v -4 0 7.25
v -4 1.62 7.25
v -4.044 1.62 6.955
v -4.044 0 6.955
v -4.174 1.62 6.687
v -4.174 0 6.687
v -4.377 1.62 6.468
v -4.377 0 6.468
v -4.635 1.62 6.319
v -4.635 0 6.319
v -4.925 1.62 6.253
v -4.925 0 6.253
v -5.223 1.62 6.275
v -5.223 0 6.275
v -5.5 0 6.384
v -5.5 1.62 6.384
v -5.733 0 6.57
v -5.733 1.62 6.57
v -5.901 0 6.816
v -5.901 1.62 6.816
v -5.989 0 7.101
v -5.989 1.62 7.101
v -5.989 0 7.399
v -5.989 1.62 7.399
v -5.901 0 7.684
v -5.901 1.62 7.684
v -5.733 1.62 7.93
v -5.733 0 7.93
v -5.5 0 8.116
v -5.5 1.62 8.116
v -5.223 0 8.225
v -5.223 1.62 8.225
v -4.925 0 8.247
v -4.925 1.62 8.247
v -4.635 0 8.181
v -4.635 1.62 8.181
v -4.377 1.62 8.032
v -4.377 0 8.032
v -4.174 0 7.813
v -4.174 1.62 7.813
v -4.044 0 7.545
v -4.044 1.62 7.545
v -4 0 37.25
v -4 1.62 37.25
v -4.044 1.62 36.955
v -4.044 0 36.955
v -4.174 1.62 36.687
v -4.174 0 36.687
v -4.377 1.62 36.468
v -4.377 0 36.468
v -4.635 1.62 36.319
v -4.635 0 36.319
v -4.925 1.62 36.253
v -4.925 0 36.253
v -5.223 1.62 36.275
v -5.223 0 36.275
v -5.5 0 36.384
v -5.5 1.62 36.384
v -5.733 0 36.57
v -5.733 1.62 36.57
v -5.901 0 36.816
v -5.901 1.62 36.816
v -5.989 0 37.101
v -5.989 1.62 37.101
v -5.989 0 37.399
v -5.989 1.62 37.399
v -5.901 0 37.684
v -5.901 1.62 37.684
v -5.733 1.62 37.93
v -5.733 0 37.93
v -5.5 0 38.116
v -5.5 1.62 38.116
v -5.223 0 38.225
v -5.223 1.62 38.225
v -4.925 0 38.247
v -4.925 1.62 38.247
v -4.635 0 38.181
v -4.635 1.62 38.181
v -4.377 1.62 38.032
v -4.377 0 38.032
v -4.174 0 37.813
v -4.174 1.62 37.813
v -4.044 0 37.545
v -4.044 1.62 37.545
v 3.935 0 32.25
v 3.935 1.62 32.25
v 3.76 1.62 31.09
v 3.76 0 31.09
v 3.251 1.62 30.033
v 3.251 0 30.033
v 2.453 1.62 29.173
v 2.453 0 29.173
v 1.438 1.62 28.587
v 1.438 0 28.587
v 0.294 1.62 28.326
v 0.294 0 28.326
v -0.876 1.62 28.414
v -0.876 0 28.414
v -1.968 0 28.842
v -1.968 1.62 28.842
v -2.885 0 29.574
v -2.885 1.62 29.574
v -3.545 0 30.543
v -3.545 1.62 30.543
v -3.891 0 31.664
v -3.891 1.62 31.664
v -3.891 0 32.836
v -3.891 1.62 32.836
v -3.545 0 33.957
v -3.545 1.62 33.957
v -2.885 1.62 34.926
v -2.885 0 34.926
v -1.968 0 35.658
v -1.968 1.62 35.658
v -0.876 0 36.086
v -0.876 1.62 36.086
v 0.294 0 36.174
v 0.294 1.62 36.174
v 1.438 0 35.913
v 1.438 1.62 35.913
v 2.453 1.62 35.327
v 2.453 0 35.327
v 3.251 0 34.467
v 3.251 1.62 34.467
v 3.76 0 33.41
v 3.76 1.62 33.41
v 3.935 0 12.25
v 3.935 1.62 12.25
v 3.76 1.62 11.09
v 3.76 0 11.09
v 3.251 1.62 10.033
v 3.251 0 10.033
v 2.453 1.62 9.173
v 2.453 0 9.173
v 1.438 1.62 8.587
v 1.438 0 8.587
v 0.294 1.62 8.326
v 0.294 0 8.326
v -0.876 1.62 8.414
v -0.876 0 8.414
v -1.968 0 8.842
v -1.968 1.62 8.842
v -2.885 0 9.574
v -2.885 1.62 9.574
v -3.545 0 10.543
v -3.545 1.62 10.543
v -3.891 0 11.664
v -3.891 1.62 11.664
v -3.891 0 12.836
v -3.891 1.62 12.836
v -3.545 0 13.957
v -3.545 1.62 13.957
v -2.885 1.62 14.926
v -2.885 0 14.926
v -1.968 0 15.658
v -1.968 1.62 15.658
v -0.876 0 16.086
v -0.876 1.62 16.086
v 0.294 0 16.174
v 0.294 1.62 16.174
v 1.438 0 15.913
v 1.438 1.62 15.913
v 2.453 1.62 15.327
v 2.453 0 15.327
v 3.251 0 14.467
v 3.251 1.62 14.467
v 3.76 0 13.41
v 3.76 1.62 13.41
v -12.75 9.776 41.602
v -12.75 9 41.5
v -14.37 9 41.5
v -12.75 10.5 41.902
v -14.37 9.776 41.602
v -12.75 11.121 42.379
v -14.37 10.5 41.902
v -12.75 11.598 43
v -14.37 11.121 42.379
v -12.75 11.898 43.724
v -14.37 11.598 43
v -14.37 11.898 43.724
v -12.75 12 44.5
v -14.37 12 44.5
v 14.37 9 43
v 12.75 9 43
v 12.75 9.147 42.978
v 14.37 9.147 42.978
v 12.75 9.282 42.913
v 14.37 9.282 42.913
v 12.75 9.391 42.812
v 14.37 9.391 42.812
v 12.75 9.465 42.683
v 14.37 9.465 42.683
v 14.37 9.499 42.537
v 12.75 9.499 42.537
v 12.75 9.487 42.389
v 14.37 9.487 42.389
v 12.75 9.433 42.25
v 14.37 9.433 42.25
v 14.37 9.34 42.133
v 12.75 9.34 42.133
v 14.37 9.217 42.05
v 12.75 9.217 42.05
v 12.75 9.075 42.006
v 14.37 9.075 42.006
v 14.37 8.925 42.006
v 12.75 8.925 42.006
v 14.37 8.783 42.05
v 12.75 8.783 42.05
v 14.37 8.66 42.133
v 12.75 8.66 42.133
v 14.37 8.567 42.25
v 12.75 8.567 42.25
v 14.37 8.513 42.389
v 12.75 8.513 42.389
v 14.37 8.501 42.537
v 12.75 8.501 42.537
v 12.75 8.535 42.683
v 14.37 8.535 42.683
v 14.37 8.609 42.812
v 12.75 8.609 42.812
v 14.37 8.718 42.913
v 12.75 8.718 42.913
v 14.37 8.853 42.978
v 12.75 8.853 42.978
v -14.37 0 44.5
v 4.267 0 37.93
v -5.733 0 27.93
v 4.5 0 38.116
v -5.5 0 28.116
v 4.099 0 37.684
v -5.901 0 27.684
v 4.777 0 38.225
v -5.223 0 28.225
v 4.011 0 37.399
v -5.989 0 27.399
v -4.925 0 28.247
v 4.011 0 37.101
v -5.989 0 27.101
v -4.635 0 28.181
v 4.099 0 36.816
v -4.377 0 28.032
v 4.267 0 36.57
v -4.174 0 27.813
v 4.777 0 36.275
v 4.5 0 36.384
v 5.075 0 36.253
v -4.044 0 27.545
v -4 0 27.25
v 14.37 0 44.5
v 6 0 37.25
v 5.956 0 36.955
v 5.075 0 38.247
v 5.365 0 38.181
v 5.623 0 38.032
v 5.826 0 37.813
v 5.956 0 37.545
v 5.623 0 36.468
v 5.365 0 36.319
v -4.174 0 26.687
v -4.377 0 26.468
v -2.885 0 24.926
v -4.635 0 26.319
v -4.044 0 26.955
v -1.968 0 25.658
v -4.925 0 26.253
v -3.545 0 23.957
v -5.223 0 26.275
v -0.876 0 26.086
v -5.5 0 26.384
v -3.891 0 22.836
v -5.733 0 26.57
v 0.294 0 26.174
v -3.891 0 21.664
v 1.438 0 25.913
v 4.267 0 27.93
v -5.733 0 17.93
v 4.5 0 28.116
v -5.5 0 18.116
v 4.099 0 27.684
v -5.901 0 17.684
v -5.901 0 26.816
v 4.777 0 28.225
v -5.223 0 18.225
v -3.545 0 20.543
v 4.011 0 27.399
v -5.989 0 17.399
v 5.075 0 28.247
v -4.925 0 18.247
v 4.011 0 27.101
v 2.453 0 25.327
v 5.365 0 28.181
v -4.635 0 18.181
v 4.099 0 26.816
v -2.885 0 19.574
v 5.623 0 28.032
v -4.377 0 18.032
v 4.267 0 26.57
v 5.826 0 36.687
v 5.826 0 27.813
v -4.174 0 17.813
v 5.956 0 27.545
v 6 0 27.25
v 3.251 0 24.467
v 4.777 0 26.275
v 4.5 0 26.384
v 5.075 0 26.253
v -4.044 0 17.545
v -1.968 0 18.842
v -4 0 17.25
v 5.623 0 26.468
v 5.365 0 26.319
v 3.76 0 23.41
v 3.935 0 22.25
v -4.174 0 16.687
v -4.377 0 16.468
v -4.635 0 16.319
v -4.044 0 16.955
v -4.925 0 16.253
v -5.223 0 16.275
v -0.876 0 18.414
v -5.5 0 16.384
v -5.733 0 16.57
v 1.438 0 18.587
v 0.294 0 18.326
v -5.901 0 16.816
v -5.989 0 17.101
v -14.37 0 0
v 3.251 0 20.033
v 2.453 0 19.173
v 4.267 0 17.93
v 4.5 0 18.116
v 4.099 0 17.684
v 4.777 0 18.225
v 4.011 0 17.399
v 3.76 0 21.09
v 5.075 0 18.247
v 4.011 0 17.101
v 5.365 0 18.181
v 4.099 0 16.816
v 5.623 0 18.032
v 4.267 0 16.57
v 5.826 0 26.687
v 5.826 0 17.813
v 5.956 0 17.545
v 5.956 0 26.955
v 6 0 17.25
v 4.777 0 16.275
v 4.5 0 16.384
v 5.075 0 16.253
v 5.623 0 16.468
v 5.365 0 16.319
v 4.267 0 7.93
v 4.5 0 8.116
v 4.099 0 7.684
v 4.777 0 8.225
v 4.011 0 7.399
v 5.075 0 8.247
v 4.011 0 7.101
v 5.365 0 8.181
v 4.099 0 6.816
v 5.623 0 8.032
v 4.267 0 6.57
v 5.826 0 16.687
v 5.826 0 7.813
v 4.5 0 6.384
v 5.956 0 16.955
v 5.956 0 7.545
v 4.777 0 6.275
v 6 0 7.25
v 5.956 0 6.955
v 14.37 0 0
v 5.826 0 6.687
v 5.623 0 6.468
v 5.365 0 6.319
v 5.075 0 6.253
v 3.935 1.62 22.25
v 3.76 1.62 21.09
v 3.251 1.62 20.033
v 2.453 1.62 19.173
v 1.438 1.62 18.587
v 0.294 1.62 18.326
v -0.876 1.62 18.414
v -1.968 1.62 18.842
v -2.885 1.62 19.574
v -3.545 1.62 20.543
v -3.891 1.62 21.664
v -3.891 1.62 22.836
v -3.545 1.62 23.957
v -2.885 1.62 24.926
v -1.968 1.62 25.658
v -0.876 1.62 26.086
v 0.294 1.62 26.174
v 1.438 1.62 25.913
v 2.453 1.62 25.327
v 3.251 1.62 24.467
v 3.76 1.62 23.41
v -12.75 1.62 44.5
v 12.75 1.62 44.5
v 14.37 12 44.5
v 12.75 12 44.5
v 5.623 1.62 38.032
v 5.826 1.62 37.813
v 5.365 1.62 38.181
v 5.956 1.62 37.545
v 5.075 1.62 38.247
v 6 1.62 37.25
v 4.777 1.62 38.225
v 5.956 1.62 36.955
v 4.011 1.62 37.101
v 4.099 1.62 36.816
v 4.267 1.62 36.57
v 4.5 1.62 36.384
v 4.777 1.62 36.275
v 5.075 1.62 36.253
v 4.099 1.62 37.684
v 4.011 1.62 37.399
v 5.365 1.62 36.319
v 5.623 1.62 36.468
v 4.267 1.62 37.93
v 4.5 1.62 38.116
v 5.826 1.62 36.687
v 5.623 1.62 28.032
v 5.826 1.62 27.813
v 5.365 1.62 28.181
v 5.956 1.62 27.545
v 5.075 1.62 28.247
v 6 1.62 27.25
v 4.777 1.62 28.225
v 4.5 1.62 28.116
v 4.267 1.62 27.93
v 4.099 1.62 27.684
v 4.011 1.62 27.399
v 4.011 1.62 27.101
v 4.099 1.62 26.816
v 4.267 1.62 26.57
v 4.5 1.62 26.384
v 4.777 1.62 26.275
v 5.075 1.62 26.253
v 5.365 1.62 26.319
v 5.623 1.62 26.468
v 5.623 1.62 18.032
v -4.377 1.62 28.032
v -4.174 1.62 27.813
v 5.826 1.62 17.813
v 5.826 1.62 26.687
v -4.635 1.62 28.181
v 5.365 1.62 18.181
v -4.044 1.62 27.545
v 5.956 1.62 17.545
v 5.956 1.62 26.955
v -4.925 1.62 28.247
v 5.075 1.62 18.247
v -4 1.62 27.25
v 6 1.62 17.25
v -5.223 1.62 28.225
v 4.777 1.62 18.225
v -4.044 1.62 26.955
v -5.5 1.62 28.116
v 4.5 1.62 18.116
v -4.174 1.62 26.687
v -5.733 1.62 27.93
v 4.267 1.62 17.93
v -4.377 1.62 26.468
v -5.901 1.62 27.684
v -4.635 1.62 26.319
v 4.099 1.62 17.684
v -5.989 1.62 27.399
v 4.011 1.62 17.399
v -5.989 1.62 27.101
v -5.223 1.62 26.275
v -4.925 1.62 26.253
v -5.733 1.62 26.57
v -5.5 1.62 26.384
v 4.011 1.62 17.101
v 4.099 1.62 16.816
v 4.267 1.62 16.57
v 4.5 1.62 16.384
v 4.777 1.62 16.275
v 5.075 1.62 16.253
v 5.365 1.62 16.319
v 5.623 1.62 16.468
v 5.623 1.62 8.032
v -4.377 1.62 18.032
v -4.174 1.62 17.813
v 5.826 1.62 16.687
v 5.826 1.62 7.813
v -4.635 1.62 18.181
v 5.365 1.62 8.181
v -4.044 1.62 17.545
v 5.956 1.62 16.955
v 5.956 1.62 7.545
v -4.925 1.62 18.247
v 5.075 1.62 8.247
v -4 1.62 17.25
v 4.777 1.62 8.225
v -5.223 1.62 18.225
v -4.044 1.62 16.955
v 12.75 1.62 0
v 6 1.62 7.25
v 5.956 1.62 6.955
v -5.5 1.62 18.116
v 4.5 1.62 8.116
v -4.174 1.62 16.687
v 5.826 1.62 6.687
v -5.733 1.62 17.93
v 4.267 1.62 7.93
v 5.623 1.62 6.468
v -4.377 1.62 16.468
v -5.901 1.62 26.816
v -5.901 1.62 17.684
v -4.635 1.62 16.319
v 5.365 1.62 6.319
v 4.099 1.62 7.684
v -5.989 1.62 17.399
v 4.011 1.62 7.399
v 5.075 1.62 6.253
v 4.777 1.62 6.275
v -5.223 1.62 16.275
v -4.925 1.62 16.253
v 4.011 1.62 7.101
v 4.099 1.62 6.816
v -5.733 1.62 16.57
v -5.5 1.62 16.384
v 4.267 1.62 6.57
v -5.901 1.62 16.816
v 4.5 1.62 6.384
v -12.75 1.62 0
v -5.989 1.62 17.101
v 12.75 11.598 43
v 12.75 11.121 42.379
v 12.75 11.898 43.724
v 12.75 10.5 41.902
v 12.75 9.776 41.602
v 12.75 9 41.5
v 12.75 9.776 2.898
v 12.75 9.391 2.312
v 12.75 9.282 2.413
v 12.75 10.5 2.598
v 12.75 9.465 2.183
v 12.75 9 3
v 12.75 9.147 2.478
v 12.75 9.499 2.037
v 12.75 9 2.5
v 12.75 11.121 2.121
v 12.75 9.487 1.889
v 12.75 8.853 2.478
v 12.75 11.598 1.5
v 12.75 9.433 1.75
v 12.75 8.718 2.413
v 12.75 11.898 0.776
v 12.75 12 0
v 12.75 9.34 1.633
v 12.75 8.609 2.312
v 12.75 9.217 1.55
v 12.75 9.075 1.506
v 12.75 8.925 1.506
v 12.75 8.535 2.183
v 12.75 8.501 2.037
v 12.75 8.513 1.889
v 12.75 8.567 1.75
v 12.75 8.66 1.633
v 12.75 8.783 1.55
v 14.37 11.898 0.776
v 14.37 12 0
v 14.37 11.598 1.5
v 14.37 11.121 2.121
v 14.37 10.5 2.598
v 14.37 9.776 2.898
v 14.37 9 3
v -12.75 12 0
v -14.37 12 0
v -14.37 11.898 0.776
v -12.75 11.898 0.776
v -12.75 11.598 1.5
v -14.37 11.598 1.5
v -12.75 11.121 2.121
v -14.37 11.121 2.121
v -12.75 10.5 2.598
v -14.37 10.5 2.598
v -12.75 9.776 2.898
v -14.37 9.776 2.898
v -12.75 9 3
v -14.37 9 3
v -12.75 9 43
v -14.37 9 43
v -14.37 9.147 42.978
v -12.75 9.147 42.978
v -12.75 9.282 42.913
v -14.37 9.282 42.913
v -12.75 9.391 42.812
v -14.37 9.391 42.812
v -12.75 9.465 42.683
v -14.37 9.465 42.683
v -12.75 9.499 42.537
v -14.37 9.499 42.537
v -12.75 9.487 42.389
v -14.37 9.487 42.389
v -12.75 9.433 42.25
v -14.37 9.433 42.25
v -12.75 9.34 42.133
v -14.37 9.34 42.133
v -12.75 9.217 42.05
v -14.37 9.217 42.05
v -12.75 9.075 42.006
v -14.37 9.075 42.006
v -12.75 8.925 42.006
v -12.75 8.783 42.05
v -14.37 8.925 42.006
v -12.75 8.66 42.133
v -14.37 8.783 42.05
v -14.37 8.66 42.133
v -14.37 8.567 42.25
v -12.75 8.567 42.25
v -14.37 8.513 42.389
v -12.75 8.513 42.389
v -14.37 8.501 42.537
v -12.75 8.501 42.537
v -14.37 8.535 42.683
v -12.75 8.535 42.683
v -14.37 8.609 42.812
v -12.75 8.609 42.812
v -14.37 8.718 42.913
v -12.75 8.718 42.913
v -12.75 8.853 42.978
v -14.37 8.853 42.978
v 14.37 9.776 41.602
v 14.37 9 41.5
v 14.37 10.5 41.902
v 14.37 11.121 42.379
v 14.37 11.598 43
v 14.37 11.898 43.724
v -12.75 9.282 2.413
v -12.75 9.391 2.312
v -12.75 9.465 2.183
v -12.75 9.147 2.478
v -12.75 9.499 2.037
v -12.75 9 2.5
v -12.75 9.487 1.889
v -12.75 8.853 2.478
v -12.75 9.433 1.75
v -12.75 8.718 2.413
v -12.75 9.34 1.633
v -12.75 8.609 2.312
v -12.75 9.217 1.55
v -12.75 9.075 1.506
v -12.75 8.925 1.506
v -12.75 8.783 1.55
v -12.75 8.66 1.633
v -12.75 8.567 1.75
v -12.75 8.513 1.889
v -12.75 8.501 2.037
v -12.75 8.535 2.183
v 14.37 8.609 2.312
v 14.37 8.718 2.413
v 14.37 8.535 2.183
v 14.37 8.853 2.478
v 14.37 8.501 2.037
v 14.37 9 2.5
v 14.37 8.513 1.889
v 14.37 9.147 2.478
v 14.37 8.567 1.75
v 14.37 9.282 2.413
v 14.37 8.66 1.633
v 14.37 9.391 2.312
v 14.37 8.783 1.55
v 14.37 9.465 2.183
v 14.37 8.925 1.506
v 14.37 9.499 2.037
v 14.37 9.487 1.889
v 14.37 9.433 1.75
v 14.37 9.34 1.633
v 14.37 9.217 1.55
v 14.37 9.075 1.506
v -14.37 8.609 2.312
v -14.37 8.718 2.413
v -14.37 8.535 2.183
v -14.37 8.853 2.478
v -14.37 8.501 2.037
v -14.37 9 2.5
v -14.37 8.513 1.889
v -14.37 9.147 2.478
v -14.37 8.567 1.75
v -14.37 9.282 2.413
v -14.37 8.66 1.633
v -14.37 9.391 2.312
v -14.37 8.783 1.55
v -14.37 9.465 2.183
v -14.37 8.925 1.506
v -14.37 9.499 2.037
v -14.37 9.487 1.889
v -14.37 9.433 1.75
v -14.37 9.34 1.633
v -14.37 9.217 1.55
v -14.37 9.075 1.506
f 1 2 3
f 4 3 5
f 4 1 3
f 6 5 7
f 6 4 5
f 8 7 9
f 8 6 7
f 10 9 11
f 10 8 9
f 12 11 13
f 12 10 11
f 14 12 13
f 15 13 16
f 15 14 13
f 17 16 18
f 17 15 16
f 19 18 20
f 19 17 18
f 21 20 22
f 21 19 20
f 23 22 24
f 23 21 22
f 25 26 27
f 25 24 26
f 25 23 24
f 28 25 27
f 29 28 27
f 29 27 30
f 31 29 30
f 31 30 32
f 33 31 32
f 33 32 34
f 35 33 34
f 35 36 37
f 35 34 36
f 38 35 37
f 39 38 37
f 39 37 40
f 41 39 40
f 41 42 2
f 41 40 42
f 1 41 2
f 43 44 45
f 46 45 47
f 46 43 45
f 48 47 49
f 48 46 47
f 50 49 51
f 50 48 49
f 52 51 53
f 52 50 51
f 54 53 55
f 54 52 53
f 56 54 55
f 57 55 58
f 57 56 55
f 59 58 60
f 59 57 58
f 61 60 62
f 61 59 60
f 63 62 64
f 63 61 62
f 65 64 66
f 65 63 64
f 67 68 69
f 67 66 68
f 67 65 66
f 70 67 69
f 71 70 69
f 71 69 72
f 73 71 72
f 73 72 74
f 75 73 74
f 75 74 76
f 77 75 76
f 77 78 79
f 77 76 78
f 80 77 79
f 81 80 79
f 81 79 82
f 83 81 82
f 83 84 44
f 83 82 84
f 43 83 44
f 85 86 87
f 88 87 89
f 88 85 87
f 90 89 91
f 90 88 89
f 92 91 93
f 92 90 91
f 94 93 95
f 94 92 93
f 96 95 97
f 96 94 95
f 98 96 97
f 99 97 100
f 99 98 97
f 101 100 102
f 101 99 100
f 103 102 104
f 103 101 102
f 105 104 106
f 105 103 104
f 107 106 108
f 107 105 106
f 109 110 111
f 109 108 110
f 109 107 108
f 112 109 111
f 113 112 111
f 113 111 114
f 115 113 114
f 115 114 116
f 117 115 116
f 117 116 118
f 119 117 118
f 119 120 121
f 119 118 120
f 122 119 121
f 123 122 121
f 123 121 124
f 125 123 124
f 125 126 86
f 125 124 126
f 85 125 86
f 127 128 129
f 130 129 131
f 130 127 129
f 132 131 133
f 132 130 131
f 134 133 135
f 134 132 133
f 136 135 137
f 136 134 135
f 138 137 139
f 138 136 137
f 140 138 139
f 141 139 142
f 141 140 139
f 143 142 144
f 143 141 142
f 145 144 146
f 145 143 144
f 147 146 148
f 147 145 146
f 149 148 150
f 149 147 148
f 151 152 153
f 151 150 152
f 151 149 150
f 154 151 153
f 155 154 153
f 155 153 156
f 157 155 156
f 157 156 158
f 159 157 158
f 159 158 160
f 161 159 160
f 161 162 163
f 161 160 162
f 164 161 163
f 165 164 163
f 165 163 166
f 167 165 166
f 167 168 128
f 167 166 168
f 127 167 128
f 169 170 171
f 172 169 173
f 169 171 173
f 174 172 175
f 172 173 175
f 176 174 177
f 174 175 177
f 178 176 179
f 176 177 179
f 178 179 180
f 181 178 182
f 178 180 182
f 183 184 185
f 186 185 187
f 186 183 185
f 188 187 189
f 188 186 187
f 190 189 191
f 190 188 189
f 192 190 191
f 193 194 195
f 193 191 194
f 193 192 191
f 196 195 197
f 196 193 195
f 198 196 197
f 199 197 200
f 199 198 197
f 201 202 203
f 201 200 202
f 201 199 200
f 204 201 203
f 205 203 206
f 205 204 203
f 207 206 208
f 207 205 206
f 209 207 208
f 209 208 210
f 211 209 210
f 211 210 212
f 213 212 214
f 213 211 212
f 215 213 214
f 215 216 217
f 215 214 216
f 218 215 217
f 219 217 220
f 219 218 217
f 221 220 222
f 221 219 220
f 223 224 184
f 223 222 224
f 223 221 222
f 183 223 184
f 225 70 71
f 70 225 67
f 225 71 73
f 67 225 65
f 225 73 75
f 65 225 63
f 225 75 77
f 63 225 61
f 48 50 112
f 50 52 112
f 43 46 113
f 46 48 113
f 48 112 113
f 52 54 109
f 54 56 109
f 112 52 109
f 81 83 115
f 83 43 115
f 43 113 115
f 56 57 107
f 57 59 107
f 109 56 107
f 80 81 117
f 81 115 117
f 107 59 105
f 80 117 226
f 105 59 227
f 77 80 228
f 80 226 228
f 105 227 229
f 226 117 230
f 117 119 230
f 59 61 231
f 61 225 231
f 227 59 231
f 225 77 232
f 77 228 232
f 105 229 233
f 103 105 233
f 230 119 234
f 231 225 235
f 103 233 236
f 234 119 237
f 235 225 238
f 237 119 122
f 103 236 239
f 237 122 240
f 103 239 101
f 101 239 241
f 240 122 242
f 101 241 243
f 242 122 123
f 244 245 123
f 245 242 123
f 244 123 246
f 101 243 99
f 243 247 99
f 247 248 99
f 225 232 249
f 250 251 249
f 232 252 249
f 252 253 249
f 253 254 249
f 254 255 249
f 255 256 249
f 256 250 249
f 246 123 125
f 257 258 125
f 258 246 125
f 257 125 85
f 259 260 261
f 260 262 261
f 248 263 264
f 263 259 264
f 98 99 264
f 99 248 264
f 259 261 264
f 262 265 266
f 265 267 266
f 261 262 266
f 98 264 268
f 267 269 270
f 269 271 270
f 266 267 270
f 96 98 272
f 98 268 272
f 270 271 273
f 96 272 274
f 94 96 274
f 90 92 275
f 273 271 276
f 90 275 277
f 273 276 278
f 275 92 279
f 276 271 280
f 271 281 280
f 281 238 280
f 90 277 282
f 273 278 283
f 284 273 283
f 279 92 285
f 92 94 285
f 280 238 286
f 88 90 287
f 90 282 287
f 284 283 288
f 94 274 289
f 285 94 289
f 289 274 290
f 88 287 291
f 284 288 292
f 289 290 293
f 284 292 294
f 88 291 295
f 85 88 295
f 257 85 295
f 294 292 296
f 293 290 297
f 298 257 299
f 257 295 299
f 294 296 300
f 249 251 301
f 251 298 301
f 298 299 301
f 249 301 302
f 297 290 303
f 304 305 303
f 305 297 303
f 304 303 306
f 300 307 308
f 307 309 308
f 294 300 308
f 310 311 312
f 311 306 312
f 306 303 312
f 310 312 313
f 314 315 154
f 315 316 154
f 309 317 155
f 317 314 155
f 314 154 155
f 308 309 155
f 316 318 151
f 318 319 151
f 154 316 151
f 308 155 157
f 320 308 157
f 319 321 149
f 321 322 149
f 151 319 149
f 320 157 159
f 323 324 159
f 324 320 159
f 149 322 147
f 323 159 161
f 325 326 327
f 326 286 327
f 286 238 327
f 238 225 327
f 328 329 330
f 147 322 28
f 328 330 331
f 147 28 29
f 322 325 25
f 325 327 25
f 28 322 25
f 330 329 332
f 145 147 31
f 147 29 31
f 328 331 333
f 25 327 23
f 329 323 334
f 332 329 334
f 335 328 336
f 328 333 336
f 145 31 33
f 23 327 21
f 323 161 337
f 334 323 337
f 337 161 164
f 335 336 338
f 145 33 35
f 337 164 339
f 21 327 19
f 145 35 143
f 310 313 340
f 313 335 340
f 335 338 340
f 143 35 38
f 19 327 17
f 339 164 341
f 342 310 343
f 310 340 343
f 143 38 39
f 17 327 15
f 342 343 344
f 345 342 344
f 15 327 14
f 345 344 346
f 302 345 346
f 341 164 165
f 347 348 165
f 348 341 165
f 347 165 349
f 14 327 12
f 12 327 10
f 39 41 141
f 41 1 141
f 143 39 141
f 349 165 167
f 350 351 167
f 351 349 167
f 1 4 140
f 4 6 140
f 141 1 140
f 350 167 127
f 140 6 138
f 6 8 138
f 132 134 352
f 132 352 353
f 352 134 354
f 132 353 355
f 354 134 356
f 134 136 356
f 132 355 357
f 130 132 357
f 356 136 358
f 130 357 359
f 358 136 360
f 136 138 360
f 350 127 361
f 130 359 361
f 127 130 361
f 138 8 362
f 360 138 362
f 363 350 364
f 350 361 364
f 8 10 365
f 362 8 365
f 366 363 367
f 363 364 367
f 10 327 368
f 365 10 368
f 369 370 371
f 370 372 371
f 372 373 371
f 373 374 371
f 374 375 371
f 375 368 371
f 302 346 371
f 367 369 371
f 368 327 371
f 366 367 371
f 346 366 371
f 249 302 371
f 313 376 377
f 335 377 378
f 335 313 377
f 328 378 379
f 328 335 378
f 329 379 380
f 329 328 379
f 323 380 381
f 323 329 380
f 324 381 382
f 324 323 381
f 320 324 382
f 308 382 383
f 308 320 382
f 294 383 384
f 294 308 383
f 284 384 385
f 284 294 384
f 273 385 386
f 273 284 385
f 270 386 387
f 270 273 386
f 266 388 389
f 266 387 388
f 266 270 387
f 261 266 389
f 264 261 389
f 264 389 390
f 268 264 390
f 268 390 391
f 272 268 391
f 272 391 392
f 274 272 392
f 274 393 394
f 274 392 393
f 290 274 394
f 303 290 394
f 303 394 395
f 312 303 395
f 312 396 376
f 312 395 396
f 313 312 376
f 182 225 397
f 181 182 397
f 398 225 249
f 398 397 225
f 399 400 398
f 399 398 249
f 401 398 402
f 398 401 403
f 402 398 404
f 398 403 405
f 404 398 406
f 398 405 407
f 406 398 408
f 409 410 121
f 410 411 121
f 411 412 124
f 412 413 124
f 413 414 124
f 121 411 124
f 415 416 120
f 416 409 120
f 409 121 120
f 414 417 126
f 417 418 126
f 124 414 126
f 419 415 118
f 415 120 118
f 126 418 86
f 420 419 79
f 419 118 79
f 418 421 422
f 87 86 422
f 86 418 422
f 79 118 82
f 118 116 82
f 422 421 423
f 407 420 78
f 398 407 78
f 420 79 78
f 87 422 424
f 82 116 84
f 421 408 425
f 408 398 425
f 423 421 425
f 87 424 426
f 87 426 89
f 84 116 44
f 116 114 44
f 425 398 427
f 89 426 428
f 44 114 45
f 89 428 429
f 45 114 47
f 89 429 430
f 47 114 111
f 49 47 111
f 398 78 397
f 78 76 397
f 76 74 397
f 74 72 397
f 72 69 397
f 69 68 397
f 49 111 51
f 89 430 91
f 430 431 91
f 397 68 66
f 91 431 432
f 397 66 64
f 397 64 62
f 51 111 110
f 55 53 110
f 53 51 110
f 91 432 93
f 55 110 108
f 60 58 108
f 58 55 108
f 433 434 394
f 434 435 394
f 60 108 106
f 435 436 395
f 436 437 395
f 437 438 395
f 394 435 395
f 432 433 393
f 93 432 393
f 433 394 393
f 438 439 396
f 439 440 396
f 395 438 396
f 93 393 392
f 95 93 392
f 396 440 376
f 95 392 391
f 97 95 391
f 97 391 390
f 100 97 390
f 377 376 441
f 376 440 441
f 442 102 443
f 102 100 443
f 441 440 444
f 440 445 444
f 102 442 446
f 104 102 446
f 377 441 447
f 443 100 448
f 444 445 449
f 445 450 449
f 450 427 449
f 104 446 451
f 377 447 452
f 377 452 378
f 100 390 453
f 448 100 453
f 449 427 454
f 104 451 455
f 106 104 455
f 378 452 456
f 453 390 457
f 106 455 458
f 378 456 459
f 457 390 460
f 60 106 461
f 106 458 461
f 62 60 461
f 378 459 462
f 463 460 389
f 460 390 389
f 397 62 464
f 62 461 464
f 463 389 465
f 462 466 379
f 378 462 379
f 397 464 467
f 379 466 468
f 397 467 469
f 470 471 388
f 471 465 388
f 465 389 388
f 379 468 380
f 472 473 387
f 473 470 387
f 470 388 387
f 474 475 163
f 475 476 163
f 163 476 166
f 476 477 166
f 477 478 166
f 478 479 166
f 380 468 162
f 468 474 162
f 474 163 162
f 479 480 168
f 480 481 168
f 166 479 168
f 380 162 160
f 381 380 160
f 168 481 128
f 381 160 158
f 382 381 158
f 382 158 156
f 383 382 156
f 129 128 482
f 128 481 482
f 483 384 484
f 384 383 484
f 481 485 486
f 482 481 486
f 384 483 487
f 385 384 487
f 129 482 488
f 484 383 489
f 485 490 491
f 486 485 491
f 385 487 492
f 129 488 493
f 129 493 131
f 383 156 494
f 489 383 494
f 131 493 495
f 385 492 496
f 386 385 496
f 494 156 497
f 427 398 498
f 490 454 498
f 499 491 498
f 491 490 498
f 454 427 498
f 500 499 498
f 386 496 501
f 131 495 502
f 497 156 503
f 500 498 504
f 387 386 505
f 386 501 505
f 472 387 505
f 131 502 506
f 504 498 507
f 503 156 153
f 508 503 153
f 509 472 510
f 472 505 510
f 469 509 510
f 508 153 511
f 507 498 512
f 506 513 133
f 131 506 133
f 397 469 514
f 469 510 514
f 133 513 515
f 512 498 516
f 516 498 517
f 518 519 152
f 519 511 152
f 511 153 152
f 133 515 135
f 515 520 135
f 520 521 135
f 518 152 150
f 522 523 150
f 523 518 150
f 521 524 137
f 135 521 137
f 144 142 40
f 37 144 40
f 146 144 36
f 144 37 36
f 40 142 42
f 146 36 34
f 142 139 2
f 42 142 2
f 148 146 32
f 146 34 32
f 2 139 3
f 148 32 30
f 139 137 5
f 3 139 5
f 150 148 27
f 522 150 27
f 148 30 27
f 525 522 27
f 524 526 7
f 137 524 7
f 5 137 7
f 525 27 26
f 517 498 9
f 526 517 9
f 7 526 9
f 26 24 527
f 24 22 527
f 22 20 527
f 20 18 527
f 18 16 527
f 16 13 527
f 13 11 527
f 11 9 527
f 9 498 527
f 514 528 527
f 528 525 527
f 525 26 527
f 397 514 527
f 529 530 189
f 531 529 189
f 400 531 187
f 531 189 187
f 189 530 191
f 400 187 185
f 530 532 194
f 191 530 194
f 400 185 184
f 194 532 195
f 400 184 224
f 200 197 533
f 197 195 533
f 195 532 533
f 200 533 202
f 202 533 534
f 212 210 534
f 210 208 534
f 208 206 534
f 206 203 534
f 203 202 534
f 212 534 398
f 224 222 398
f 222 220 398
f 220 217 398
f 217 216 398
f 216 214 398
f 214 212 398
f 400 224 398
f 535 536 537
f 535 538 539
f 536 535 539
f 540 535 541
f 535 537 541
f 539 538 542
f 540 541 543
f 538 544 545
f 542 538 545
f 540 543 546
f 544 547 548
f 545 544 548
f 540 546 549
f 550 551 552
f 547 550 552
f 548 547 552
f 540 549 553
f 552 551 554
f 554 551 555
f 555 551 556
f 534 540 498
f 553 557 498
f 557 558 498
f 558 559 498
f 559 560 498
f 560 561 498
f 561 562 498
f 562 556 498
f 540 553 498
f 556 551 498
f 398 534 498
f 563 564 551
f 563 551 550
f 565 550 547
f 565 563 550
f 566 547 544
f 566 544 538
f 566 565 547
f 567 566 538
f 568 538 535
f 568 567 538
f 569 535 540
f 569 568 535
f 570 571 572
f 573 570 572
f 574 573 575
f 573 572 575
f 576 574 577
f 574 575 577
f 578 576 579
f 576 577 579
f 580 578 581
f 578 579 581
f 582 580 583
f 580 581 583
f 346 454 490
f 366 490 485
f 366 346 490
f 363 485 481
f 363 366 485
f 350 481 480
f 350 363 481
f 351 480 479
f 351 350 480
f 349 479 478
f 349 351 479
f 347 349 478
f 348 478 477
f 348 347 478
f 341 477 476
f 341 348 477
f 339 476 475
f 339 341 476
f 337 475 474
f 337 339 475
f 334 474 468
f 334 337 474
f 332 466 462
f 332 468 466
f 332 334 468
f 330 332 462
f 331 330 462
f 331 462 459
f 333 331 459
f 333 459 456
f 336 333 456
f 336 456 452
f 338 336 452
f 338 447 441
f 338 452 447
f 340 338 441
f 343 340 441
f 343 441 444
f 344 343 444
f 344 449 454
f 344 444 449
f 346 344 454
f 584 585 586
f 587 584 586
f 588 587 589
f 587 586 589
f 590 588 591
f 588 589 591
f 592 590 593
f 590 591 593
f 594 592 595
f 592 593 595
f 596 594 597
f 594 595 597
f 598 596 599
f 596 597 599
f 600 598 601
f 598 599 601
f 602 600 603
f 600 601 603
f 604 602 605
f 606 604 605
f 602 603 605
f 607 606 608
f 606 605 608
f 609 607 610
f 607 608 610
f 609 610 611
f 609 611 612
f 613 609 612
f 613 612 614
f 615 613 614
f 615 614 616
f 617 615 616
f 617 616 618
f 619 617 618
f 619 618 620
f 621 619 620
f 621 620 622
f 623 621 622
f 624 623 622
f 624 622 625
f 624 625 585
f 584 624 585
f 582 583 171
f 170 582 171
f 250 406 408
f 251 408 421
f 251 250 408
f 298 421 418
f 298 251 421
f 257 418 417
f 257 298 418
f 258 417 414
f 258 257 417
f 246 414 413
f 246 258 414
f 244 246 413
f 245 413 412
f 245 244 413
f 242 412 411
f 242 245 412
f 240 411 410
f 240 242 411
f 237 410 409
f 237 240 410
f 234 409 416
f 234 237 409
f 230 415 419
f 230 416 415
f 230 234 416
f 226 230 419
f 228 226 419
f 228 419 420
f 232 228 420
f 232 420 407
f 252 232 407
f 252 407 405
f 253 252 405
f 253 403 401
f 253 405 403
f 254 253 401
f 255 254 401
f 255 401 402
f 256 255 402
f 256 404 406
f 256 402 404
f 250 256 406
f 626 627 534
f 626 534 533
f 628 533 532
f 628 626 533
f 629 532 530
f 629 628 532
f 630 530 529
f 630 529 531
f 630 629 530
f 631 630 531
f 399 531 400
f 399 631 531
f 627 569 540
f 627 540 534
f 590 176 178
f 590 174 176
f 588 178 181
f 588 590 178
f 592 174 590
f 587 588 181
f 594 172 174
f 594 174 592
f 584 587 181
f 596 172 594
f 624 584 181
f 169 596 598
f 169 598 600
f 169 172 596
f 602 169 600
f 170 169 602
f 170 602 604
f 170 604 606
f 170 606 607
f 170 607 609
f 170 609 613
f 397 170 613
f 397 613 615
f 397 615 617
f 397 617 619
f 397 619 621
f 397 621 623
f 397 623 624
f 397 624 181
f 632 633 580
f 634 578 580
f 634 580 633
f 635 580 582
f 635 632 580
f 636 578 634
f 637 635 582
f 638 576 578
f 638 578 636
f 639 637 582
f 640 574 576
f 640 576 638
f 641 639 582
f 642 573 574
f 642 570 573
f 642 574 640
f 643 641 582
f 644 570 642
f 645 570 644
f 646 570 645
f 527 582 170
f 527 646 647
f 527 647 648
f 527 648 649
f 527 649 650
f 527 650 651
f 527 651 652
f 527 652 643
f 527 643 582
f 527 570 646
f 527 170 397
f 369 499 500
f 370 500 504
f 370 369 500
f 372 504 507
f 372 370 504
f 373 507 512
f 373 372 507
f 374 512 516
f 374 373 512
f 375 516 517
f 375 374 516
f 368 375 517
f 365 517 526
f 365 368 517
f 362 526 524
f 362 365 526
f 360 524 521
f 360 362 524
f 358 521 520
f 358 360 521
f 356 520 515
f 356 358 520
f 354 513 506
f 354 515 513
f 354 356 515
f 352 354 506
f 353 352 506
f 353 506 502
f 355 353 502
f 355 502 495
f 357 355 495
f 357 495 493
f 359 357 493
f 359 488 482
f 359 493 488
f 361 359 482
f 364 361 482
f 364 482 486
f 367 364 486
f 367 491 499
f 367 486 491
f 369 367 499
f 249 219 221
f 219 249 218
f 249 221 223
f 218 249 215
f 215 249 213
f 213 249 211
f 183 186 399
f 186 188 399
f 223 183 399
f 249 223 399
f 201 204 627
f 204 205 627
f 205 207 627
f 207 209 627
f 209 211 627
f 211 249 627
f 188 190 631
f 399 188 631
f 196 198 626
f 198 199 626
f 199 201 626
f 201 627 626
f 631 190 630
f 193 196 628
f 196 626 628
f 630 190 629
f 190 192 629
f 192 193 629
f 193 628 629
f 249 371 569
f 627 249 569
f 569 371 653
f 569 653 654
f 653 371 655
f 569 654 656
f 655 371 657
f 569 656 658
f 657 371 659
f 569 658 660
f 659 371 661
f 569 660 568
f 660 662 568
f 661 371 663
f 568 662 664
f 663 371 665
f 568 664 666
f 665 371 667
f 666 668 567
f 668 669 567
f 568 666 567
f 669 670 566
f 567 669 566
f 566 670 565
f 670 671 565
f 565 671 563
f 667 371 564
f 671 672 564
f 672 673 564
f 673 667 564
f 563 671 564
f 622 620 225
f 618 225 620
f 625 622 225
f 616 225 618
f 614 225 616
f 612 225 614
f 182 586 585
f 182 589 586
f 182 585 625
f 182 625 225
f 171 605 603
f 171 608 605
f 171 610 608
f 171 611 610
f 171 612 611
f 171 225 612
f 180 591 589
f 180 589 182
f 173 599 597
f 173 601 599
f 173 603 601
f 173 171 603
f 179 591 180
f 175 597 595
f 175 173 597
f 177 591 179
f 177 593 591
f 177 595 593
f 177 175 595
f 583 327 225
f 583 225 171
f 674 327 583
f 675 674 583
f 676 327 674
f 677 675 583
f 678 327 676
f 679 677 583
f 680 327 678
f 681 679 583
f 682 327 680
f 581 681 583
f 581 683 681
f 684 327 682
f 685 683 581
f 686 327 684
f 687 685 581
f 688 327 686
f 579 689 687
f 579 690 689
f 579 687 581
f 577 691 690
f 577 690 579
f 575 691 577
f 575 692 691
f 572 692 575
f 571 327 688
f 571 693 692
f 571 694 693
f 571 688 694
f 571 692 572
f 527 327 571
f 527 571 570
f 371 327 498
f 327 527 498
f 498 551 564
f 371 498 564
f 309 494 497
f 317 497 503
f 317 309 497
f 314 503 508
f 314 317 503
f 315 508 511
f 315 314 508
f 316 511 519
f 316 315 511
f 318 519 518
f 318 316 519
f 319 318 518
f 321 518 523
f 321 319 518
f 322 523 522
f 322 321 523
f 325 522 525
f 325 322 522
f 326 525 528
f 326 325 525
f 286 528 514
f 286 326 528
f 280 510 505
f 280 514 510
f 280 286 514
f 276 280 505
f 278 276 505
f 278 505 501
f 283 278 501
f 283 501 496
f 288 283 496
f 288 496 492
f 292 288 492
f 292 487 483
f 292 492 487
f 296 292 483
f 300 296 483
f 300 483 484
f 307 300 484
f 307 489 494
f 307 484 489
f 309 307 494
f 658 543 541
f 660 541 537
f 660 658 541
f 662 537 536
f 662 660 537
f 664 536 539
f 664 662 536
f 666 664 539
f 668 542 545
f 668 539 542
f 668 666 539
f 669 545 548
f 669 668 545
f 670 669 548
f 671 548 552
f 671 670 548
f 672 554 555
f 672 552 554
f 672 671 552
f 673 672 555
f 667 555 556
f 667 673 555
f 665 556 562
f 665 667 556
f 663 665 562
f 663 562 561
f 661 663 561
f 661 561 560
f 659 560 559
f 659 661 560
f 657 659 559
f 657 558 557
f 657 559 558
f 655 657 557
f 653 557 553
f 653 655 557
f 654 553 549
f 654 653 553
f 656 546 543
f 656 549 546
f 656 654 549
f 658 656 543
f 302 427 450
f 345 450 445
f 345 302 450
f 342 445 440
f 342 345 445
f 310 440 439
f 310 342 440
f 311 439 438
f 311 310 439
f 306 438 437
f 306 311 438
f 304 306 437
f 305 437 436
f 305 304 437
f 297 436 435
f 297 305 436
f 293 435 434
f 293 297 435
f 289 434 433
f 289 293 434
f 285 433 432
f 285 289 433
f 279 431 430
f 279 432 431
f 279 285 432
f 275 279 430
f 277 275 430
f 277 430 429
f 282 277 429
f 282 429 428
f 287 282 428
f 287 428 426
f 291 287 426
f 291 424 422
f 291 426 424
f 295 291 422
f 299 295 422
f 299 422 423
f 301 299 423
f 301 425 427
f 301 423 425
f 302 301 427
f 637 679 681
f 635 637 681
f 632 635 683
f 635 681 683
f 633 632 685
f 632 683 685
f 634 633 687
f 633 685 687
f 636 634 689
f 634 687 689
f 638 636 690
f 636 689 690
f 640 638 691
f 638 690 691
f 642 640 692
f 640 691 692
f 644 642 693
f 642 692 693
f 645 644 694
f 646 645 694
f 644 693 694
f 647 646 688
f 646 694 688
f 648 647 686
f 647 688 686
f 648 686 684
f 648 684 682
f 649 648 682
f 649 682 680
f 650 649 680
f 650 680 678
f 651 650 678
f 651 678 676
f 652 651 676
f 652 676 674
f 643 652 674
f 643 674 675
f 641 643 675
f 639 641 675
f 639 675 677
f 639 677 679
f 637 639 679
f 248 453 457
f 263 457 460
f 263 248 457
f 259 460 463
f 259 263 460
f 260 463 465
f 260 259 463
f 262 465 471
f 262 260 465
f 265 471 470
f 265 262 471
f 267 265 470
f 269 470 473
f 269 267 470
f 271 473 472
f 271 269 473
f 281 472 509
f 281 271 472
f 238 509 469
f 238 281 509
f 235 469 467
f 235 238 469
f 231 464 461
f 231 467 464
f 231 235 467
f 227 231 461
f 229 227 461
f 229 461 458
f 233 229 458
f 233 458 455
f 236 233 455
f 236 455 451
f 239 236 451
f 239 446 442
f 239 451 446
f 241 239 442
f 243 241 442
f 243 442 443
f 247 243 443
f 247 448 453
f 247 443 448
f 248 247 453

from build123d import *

# Parameters (mm, degrees)
BOSS_EXTRUDE1_DEPTH = 44.5
SKETCH2_R           = 0.5
CUT_EXTRUDE1_DEPTH  = 44.5
SKETCH3_R           = 3.935
SKETCH3_R_2         = 1
CUT_EXTRUDE2_DEPTH  = 20.5


with BuildPart() as part:
    # Sketch1 → Boss-Extrude1 (new body)
    with BuildSketch(Plane.XY):
        Polygon((0, 0), (-14.37, 0), (-14.37, 12), (-12.75, 12), (-12.75, 1.62), (0, 1.62), align=None)
    boss_extrude1 = extrude(amount=BOSS_EXTRUDE1_DEPTH)

    # Sketch2 → Cut-Extrude1 (cut)
    with BuildSketch(Plane.ZY.offset(14.37)):
        with Locations((2, 9)):
            Circle(SKETCH2_R)
        with Locations((42.5, 9)):
            Circle(SKETCH2_R)
        with BuildLine():
            Line((3, 9), (41.5, 9))
            ThreePointArc((41.5, 9), (42.378679656, 11.121320344), (44.5, 12))
            Line((44.5, 12), (44.5, 14.744822673))
            Line((44.5, 14.744822673), (0, 14.744822673))
            Line((0, 14.744822673), (0, 12))
            ThreePointArc((0, 12), (2.121320344, 11.121320344), (3, 9))
        make_face()
    cut_extrude1 = extrude(amount=-CUT_EXTRUDE1_DEPTH, mode=Mode.SUBTRACT)

    # Mirror1: Boss-Extrude1, Cut-Extrude1 across plane
    add(boss_extrude1.mirror(Plane(origin=(0, 1.62, 44.5), x_dir=(0, 0, 1), z_dir=(-1, 0, 0))))
    add(cut_extrude1.mirror(Plane(origin=(0, 1.62, 44.5), x_dir=(0, 0, 1), z_dir=(-1, 0, 0))), mode=Mode.SUBTRACT)

    # Sketch3 → Cut-Extrude2 (cut)
    with BuildSketch(Plane(origin=(0, 0, 0), x_dir=(1, 0, 0), z_dir=(0, 1, 0))):
        with Locations((0, -12.25)):
            Circle(SKETCH3_R)
        with Locations((-5, -7.25)):
            Circle(SKETCH3_R_2)
        with Locations((5, -7.25)):
            Circle(SKETCH3_R_2)
        with Locations((5, -17.25)):
            Circle(SKETCH3_R_2)
        with Locations((-5, -17.25)):
            Circle(SKETCH3_R_2)
        with Locations((0, -22.25)):
            Circle(SKETCH3_R)
        with Locations((-5, -27.25)):
            Circle(SKETCH3_R_2)
        with Locations((5, -27.25)):
            Circle(SKETCH3_R_2)
        with Locations((0, -32.25)):
            Circle(SKETCH3_R)
        with Locations((-5, -37.25)):
            Circle(SKETCH3_R_2)
        with Locations((5, -37.25)):
            Circle(SKETCH3_R_2)
    extrude(amount=CUT_EXTRUDE2_DEPTH, mode=Mode.SUBTRACT)


solid = part.part
